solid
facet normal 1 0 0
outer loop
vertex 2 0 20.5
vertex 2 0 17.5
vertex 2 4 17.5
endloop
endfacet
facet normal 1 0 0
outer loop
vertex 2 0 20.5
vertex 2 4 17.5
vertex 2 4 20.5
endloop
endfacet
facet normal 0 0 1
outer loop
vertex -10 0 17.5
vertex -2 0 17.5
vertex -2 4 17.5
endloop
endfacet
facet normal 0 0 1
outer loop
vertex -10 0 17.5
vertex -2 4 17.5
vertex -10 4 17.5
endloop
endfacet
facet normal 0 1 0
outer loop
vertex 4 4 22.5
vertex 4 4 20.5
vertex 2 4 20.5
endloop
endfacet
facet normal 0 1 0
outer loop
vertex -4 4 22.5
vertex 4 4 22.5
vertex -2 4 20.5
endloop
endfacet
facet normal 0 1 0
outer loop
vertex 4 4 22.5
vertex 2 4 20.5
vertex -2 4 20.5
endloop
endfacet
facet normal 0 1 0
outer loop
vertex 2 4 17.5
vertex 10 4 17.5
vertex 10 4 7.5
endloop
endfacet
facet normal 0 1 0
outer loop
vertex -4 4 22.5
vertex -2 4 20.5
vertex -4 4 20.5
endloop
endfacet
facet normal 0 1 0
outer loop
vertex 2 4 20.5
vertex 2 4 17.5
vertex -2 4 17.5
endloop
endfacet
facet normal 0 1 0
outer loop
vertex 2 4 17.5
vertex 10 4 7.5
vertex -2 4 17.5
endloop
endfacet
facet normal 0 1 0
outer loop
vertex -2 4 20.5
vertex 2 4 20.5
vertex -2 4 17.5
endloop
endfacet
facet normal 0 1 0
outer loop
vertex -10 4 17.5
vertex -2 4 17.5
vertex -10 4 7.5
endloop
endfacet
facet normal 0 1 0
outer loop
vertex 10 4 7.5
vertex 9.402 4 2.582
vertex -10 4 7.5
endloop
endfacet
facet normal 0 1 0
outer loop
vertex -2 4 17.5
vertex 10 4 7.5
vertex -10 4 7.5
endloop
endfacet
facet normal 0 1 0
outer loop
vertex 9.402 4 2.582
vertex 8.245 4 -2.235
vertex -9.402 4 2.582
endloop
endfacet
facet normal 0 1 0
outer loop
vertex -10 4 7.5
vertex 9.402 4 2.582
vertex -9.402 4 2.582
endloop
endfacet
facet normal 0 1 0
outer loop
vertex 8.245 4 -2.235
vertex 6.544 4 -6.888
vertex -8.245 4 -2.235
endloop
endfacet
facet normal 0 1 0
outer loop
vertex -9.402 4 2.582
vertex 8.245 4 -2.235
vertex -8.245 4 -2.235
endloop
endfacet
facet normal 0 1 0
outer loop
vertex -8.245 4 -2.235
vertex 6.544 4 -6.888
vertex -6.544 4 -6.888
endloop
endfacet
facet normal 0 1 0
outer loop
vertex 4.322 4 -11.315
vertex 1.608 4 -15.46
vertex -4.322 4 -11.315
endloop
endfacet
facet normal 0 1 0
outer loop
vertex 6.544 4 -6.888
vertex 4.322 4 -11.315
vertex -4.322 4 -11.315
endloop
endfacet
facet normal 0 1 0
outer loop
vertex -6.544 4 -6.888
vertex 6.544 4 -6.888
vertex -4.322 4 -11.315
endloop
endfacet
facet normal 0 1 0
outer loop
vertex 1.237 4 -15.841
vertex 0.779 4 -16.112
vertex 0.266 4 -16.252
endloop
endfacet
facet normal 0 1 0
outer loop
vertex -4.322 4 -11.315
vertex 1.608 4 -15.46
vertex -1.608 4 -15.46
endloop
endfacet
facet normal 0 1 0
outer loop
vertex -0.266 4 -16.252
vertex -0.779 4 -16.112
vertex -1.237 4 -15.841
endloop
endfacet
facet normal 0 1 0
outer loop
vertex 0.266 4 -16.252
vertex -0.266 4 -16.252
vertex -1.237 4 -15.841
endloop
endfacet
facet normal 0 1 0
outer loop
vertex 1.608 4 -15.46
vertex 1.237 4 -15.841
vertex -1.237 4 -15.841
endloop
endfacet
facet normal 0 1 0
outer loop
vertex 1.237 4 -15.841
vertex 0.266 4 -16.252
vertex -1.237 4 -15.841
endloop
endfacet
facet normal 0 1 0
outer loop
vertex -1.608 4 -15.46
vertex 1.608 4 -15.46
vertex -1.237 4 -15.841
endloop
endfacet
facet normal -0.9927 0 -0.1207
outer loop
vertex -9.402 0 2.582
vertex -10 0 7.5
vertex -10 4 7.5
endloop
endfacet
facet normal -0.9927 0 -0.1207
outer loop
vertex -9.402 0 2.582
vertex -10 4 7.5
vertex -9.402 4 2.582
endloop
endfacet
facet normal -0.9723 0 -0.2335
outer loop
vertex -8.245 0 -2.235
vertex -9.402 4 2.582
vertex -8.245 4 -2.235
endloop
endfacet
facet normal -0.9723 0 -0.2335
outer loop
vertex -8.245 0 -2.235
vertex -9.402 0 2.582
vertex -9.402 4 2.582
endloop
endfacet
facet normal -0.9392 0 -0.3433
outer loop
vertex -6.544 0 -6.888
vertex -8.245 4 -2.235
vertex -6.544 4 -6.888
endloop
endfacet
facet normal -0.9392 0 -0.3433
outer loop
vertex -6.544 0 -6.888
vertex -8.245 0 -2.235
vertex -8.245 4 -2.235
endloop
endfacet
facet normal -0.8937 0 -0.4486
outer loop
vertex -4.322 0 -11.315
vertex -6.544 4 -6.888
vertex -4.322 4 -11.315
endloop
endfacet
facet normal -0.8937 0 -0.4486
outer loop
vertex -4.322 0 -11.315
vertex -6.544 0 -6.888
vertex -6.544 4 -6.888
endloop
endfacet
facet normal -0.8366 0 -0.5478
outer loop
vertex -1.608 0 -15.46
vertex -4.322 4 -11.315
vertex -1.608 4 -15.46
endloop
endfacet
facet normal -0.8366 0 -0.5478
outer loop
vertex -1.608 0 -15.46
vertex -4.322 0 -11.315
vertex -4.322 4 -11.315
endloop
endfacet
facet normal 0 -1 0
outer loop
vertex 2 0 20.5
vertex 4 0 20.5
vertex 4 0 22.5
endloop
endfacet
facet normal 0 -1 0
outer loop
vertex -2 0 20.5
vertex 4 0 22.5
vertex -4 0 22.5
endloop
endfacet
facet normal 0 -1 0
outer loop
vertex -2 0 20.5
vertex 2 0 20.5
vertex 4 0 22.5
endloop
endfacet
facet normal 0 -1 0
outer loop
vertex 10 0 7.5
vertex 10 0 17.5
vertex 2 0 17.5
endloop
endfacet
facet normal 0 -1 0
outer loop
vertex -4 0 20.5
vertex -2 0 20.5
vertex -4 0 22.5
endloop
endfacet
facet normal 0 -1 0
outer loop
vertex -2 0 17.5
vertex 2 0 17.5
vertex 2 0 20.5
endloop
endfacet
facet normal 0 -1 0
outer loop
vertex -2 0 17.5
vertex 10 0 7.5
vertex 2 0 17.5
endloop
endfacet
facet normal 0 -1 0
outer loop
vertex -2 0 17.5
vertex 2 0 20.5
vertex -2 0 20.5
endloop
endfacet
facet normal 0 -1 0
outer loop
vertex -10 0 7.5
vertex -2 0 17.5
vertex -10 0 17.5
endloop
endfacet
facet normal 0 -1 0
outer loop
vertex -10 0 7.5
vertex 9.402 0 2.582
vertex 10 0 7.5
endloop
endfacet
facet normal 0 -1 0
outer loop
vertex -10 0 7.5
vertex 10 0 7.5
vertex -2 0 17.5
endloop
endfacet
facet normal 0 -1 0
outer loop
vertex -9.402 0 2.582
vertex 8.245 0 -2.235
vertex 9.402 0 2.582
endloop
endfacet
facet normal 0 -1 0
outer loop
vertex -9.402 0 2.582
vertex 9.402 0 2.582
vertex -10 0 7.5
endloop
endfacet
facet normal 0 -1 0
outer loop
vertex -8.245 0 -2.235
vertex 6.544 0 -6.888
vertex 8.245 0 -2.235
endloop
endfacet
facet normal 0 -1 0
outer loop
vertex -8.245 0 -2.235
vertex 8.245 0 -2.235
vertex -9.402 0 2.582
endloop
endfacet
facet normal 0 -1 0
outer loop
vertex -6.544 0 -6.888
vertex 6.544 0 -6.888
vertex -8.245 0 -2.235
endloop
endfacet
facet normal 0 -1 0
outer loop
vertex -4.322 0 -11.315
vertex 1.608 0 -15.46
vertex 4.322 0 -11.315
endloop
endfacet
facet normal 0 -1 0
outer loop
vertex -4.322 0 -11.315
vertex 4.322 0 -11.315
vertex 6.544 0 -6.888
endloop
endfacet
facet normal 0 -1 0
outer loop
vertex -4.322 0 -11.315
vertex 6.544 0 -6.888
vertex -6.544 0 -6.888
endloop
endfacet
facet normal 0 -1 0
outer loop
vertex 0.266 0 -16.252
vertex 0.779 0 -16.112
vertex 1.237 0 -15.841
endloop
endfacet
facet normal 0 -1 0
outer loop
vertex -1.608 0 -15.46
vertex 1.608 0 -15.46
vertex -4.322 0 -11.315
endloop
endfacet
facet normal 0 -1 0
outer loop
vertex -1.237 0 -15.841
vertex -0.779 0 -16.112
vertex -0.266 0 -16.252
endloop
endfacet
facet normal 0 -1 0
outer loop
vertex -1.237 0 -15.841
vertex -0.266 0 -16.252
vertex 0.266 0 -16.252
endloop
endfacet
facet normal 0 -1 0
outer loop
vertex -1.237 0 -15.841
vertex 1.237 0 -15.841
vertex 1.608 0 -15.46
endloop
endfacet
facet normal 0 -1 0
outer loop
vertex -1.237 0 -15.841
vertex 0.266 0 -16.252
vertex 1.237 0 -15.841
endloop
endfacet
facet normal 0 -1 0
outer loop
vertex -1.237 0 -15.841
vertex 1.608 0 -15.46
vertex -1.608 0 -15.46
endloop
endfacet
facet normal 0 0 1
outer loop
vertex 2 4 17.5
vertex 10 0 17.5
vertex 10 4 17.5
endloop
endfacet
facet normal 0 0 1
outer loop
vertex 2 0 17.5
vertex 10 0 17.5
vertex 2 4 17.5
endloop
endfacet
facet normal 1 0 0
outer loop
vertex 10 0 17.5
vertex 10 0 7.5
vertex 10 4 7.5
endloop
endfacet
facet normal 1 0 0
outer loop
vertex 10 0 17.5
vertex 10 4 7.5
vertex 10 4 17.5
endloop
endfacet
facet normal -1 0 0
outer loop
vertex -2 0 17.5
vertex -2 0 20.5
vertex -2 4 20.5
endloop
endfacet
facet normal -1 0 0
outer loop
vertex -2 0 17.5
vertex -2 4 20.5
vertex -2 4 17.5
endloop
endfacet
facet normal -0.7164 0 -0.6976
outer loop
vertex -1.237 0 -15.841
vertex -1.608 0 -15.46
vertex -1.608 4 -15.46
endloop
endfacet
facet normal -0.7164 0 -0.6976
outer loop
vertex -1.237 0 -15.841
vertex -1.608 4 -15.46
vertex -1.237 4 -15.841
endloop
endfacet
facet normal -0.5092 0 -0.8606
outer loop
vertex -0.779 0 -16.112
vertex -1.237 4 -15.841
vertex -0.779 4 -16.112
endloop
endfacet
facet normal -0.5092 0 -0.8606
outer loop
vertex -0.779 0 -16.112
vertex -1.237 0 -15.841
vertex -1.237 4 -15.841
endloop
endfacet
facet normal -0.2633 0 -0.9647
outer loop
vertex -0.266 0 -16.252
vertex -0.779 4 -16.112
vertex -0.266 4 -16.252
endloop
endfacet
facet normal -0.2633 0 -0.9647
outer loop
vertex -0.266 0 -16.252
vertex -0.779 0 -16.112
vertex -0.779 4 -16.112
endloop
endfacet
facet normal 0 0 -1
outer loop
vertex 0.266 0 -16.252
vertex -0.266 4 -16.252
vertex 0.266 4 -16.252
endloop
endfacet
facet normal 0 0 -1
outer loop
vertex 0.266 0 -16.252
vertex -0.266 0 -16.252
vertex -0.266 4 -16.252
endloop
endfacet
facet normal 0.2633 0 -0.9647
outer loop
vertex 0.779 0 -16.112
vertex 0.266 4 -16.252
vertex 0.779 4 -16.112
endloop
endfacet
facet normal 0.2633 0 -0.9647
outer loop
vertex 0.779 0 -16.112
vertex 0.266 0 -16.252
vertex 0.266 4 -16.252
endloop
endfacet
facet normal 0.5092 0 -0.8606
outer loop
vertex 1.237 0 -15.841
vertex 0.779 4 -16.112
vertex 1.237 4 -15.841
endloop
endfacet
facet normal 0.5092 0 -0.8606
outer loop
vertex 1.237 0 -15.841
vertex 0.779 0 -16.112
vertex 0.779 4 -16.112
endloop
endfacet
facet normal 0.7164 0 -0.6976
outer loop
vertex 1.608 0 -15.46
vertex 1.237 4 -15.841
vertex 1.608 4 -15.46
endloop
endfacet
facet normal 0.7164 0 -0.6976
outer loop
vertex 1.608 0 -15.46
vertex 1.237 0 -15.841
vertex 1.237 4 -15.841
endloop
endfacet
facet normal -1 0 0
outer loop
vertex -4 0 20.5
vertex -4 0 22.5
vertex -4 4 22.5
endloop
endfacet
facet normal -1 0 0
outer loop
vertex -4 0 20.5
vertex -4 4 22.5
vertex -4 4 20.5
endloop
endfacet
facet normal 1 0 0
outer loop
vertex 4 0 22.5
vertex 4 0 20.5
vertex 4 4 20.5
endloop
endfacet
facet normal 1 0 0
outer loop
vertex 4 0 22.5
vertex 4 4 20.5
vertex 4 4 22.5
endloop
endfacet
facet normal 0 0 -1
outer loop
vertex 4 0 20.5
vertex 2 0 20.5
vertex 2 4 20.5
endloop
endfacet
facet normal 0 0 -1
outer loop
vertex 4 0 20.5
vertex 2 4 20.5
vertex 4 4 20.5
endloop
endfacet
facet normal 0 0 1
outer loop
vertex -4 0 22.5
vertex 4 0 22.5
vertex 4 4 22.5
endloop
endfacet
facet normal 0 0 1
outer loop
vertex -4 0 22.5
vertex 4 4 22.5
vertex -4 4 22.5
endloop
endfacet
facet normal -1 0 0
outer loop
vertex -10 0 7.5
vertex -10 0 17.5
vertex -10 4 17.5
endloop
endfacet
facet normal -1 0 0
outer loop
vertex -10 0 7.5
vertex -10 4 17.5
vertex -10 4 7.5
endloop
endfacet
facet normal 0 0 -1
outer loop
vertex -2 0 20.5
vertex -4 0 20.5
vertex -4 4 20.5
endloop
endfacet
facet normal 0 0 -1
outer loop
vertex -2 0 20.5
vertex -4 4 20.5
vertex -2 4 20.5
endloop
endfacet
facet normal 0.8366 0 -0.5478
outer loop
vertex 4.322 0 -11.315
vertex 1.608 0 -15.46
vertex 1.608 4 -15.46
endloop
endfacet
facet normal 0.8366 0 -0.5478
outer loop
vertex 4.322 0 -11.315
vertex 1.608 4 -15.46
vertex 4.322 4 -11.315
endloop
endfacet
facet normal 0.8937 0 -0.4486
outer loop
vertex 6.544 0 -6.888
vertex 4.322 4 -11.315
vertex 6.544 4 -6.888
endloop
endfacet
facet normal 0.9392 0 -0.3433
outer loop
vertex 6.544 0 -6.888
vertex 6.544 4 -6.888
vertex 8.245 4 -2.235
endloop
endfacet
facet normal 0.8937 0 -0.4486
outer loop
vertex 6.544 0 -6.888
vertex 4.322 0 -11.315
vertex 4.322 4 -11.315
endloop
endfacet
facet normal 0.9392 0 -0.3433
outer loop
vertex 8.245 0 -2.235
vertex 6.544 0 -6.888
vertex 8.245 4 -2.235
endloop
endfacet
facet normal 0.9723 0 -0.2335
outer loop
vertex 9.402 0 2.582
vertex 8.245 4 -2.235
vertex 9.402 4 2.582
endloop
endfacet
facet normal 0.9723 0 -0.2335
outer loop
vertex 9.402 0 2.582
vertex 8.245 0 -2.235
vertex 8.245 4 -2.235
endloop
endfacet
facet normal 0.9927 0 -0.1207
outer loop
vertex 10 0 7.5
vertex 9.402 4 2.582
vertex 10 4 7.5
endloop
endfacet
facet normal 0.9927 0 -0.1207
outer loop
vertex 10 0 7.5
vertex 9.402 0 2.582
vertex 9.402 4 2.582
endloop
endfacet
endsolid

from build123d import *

# Parameters (mm, degrees)
EXTRUDE_1_DEPTH = 4


with BuildPart() as part:
    # Эскиз1 → Бобышка-Вытянуть1 (new body)
    with BuildSketch(Plane(origin=(0, 0, 0), x_dir=(1, 0, 0), z_dir=(0, 1, 0))):
        with BuildLine():
            Line((10, -17.5), (2, -17.5))
            Line((2, -17.5), (2, -20.5))
            Line((2, -20.5), (4, -20.5))
            Line((4, -20.5), (4, -22.5))
            Line((4, -22.5), (-4, -22.5))
            Line((-4, -22.5), (-4, -20.5))
            Line((-4, -20.5), (-2, -20.5))
            Line((-2, -20.5), (-2, -17.5))
            Line((-2, -17.5), (-10, -17.5))
            Line((-10, -17.5), (-10, -7.5))
            ThreePointArc((-10, -7.5), (-7.461085915, 4.585557713), (-1.607525862, 15.459500175))
            ThreePointArc((-1.607525862, 15.459500175), (0, 16.269600766), (1.607525862, 15.459500175))
            ThreePointArc((1.607525862, 15.459500175), (7.461085915, 4.585557713), (10, -7.5))
            Line((10, -7.5), (10, -17.5))
        make_face()
    extrude(amount=EXTRUDE_1_DEPTH)


solid = part.part
